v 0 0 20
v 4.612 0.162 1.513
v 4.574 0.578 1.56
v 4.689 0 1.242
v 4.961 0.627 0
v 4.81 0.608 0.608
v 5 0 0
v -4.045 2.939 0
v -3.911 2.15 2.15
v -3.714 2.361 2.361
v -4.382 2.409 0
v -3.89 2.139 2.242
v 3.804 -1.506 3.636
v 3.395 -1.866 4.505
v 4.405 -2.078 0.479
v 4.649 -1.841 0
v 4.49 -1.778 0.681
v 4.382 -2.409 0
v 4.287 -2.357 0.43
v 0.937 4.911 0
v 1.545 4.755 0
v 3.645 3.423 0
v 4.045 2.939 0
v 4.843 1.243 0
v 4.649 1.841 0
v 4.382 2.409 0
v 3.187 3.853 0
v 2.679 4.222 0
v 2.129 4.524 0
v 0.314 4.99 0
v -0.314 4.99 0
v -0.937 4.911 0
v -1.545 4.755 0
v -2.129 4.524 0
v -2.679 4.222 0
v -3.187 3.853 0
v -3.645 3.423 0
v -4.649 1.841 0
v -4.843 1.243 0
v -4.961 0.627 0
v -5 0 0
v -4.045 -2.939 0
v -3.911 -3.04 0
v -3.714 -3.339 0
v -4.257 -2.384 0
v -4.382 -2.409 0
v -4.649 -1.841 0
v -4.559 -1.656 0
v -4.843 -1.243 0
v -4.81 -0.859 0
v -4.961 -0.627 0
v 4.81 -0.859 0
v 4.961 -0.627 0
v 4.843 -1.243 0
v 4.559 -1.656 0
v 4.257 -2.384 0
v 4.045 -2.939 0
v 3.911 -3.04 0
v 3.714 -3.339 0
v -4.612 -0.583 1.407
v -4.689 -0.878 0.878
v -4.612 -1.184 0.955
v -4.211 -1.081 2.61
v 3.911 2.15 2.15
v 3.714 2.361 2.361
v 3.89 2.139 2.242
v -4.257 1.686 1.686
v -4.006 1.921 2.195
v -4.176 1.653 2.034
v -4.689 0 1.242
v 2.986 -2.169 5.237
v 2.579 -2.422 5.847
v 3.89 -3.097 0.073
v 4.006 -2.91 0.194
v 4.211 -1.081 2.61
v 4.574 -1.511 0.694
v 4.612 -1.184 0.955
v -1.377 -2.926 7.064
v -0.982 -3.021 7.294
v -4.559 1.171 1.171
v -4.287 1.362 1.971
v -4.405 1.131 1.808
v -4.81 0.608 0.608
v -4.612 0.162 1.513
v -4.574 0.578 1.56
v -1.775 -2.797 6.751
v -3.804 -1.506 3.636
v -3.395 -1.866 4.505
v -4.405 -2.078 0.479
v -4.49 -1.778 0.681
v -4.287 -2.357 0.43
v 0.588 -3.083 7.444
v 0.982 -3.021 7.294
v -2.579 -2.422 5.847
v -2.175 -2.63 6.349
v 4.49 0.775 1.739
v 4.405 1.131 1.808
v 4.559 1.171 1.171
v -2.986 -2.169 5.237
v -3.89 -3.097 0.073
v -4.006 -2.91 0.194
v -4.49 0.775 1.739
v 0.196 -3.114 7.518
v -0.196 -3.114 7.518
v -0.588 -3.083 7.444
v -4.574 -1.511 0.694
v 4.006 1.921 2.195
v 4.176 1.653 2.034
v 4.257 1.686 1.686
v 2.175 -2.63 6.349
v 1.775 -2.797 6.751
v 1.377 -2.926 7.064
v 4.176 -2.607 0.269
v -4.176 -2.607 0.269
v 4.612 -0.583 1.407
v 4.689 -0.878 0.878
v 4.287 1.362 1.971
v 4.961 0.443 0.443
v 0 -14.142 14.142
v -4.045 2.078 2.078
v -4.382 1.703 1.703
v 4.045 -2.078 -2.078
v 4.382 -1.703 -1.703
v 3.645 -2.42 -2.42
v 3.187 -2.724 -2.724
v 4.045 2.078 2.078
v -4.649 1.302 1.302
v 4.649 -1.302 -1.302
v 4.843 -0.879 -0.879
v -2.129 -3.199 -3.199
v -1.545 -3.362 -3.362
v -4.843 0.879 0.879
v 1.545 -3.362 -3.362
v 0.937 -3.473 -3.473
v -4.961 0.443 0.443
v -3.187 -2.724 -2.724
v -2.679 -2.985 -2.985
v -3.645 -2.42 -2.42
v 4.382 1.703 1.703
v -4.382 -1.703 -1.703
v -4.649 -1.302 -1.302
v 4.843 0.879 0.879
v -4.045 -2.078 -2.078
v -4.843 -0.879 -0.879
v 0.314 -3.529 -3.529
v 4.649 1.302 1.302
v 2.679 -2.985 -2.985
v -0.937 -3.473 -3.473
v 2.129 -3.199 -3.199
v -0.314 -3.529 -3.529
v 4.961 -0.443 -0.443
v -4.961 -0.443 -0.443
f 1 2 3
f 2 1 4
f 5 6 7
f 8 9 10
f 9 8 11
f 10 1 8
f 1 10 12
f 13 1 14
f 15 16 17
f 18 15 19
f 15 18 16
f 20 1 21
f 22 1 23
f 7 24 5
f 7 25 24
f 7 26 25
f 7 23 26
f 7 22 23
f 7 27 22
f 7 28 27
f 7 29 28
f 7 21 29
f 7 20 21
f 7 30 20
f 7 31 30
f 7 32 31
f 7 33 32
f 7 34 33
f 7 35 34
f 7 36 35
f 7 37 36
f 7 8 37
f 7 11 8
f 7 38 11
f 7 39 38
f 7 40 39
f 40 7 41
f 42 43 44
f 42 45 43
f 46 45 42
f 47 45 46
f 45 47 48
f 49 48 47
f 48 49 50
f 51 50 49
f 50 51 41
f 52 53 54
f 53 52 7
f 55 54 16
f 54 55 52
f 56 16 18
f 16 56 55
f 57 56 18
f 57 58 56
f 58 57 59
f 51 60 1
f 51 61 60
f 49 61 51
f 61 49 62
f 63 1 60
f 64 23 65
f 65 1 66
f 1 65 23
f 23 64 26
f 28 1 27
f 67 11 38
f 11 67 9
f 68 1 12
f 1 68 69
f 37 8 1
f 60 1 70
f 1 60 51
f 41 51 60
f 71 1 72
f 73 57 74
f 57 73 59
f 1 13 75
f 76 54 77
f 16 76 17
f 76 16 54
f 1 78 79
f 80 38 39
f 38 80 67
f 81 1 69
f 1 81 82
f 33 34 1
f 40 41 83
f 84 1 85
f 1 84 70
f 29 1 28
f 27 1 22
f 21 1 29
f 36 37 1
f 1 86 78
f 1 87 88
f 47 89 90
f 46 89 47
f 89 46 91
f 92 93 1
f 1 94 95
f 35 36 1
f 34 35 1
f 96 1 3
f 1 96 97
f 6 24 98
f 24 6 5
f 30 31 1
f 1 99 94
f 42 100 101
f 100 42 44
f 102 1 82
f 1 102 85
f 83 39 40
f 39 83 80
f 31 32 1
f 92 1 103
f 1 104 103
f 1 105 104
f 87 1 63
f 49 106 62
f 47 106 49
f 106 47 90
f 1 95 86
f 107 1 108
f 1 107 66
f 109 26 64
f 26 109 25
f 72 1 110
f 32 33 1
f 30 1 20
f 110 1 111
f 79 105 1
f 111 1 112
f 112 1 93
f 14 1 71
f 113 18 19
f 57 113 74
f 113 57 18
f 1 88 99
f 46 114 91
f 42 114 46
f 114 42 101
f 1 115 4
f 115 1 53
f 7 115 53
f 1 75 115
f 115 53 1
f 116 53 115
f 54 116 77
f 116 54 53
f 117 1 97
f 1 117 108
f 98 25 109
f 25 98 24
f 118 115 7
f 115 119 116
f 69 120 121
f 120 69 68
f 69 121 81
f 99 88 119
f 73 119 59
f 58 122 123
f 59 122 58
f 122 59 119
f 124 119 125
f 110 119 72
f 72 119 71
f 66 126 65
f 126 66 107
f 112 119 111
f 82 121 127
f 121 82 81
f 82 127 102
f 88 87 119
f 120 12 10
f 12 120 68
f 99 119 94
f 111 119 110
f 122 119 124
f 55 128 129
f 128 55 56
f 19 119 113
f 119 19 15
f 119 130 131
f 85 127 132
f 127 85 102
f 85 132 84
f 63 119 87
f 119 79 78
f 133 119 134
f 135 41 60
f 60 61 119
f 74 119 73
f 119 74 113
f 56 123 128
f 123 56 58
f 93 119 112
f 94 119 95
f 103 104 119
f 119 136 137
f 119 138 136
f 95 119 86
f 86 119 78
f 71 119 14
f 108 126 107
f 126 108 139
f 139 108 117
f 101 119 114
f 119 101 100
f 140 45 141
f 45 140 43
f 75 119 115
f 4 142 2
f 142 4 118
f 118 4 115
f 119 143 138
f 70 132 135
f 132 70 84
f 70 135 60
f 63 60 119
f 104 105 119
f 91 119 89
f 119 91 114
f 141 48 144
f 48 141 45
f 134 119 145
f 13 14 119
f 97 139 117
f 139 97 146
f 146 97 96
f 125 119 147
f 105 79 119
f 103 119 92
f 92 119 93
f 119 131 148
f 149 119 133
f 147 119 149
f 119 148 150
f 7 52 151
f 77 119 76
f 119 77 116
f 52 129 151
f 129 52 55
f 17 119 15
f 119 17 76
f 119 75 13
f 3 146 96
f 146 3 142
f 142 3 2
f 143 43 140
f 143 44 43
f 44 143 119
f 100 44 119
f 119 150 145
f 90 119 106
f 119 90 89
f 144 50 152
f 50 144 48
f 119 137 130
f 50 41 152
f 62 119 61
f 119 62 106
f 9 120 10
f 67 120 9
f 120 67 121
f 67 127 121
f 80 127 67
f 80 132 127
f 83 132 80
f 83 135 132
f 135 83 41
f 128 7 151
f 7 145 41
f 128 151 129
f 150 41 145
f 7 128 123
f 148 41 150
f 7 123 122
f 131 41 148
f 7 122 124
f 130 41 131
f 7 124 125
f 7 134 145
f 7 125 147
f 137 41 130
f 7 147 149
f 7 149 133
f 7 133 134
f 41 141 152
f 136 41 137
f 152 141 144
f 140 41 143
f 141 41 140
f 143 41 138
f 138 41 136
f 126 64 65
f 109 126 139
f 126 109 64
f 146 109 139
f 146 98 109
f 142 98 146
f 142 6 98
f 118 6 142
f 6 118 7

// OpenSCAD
$fn=50;
cylinder(h=20, r1=5, r2=0);
rotate([45, 0, 0]) cylinder(h=20, r1=5, r2=0);
